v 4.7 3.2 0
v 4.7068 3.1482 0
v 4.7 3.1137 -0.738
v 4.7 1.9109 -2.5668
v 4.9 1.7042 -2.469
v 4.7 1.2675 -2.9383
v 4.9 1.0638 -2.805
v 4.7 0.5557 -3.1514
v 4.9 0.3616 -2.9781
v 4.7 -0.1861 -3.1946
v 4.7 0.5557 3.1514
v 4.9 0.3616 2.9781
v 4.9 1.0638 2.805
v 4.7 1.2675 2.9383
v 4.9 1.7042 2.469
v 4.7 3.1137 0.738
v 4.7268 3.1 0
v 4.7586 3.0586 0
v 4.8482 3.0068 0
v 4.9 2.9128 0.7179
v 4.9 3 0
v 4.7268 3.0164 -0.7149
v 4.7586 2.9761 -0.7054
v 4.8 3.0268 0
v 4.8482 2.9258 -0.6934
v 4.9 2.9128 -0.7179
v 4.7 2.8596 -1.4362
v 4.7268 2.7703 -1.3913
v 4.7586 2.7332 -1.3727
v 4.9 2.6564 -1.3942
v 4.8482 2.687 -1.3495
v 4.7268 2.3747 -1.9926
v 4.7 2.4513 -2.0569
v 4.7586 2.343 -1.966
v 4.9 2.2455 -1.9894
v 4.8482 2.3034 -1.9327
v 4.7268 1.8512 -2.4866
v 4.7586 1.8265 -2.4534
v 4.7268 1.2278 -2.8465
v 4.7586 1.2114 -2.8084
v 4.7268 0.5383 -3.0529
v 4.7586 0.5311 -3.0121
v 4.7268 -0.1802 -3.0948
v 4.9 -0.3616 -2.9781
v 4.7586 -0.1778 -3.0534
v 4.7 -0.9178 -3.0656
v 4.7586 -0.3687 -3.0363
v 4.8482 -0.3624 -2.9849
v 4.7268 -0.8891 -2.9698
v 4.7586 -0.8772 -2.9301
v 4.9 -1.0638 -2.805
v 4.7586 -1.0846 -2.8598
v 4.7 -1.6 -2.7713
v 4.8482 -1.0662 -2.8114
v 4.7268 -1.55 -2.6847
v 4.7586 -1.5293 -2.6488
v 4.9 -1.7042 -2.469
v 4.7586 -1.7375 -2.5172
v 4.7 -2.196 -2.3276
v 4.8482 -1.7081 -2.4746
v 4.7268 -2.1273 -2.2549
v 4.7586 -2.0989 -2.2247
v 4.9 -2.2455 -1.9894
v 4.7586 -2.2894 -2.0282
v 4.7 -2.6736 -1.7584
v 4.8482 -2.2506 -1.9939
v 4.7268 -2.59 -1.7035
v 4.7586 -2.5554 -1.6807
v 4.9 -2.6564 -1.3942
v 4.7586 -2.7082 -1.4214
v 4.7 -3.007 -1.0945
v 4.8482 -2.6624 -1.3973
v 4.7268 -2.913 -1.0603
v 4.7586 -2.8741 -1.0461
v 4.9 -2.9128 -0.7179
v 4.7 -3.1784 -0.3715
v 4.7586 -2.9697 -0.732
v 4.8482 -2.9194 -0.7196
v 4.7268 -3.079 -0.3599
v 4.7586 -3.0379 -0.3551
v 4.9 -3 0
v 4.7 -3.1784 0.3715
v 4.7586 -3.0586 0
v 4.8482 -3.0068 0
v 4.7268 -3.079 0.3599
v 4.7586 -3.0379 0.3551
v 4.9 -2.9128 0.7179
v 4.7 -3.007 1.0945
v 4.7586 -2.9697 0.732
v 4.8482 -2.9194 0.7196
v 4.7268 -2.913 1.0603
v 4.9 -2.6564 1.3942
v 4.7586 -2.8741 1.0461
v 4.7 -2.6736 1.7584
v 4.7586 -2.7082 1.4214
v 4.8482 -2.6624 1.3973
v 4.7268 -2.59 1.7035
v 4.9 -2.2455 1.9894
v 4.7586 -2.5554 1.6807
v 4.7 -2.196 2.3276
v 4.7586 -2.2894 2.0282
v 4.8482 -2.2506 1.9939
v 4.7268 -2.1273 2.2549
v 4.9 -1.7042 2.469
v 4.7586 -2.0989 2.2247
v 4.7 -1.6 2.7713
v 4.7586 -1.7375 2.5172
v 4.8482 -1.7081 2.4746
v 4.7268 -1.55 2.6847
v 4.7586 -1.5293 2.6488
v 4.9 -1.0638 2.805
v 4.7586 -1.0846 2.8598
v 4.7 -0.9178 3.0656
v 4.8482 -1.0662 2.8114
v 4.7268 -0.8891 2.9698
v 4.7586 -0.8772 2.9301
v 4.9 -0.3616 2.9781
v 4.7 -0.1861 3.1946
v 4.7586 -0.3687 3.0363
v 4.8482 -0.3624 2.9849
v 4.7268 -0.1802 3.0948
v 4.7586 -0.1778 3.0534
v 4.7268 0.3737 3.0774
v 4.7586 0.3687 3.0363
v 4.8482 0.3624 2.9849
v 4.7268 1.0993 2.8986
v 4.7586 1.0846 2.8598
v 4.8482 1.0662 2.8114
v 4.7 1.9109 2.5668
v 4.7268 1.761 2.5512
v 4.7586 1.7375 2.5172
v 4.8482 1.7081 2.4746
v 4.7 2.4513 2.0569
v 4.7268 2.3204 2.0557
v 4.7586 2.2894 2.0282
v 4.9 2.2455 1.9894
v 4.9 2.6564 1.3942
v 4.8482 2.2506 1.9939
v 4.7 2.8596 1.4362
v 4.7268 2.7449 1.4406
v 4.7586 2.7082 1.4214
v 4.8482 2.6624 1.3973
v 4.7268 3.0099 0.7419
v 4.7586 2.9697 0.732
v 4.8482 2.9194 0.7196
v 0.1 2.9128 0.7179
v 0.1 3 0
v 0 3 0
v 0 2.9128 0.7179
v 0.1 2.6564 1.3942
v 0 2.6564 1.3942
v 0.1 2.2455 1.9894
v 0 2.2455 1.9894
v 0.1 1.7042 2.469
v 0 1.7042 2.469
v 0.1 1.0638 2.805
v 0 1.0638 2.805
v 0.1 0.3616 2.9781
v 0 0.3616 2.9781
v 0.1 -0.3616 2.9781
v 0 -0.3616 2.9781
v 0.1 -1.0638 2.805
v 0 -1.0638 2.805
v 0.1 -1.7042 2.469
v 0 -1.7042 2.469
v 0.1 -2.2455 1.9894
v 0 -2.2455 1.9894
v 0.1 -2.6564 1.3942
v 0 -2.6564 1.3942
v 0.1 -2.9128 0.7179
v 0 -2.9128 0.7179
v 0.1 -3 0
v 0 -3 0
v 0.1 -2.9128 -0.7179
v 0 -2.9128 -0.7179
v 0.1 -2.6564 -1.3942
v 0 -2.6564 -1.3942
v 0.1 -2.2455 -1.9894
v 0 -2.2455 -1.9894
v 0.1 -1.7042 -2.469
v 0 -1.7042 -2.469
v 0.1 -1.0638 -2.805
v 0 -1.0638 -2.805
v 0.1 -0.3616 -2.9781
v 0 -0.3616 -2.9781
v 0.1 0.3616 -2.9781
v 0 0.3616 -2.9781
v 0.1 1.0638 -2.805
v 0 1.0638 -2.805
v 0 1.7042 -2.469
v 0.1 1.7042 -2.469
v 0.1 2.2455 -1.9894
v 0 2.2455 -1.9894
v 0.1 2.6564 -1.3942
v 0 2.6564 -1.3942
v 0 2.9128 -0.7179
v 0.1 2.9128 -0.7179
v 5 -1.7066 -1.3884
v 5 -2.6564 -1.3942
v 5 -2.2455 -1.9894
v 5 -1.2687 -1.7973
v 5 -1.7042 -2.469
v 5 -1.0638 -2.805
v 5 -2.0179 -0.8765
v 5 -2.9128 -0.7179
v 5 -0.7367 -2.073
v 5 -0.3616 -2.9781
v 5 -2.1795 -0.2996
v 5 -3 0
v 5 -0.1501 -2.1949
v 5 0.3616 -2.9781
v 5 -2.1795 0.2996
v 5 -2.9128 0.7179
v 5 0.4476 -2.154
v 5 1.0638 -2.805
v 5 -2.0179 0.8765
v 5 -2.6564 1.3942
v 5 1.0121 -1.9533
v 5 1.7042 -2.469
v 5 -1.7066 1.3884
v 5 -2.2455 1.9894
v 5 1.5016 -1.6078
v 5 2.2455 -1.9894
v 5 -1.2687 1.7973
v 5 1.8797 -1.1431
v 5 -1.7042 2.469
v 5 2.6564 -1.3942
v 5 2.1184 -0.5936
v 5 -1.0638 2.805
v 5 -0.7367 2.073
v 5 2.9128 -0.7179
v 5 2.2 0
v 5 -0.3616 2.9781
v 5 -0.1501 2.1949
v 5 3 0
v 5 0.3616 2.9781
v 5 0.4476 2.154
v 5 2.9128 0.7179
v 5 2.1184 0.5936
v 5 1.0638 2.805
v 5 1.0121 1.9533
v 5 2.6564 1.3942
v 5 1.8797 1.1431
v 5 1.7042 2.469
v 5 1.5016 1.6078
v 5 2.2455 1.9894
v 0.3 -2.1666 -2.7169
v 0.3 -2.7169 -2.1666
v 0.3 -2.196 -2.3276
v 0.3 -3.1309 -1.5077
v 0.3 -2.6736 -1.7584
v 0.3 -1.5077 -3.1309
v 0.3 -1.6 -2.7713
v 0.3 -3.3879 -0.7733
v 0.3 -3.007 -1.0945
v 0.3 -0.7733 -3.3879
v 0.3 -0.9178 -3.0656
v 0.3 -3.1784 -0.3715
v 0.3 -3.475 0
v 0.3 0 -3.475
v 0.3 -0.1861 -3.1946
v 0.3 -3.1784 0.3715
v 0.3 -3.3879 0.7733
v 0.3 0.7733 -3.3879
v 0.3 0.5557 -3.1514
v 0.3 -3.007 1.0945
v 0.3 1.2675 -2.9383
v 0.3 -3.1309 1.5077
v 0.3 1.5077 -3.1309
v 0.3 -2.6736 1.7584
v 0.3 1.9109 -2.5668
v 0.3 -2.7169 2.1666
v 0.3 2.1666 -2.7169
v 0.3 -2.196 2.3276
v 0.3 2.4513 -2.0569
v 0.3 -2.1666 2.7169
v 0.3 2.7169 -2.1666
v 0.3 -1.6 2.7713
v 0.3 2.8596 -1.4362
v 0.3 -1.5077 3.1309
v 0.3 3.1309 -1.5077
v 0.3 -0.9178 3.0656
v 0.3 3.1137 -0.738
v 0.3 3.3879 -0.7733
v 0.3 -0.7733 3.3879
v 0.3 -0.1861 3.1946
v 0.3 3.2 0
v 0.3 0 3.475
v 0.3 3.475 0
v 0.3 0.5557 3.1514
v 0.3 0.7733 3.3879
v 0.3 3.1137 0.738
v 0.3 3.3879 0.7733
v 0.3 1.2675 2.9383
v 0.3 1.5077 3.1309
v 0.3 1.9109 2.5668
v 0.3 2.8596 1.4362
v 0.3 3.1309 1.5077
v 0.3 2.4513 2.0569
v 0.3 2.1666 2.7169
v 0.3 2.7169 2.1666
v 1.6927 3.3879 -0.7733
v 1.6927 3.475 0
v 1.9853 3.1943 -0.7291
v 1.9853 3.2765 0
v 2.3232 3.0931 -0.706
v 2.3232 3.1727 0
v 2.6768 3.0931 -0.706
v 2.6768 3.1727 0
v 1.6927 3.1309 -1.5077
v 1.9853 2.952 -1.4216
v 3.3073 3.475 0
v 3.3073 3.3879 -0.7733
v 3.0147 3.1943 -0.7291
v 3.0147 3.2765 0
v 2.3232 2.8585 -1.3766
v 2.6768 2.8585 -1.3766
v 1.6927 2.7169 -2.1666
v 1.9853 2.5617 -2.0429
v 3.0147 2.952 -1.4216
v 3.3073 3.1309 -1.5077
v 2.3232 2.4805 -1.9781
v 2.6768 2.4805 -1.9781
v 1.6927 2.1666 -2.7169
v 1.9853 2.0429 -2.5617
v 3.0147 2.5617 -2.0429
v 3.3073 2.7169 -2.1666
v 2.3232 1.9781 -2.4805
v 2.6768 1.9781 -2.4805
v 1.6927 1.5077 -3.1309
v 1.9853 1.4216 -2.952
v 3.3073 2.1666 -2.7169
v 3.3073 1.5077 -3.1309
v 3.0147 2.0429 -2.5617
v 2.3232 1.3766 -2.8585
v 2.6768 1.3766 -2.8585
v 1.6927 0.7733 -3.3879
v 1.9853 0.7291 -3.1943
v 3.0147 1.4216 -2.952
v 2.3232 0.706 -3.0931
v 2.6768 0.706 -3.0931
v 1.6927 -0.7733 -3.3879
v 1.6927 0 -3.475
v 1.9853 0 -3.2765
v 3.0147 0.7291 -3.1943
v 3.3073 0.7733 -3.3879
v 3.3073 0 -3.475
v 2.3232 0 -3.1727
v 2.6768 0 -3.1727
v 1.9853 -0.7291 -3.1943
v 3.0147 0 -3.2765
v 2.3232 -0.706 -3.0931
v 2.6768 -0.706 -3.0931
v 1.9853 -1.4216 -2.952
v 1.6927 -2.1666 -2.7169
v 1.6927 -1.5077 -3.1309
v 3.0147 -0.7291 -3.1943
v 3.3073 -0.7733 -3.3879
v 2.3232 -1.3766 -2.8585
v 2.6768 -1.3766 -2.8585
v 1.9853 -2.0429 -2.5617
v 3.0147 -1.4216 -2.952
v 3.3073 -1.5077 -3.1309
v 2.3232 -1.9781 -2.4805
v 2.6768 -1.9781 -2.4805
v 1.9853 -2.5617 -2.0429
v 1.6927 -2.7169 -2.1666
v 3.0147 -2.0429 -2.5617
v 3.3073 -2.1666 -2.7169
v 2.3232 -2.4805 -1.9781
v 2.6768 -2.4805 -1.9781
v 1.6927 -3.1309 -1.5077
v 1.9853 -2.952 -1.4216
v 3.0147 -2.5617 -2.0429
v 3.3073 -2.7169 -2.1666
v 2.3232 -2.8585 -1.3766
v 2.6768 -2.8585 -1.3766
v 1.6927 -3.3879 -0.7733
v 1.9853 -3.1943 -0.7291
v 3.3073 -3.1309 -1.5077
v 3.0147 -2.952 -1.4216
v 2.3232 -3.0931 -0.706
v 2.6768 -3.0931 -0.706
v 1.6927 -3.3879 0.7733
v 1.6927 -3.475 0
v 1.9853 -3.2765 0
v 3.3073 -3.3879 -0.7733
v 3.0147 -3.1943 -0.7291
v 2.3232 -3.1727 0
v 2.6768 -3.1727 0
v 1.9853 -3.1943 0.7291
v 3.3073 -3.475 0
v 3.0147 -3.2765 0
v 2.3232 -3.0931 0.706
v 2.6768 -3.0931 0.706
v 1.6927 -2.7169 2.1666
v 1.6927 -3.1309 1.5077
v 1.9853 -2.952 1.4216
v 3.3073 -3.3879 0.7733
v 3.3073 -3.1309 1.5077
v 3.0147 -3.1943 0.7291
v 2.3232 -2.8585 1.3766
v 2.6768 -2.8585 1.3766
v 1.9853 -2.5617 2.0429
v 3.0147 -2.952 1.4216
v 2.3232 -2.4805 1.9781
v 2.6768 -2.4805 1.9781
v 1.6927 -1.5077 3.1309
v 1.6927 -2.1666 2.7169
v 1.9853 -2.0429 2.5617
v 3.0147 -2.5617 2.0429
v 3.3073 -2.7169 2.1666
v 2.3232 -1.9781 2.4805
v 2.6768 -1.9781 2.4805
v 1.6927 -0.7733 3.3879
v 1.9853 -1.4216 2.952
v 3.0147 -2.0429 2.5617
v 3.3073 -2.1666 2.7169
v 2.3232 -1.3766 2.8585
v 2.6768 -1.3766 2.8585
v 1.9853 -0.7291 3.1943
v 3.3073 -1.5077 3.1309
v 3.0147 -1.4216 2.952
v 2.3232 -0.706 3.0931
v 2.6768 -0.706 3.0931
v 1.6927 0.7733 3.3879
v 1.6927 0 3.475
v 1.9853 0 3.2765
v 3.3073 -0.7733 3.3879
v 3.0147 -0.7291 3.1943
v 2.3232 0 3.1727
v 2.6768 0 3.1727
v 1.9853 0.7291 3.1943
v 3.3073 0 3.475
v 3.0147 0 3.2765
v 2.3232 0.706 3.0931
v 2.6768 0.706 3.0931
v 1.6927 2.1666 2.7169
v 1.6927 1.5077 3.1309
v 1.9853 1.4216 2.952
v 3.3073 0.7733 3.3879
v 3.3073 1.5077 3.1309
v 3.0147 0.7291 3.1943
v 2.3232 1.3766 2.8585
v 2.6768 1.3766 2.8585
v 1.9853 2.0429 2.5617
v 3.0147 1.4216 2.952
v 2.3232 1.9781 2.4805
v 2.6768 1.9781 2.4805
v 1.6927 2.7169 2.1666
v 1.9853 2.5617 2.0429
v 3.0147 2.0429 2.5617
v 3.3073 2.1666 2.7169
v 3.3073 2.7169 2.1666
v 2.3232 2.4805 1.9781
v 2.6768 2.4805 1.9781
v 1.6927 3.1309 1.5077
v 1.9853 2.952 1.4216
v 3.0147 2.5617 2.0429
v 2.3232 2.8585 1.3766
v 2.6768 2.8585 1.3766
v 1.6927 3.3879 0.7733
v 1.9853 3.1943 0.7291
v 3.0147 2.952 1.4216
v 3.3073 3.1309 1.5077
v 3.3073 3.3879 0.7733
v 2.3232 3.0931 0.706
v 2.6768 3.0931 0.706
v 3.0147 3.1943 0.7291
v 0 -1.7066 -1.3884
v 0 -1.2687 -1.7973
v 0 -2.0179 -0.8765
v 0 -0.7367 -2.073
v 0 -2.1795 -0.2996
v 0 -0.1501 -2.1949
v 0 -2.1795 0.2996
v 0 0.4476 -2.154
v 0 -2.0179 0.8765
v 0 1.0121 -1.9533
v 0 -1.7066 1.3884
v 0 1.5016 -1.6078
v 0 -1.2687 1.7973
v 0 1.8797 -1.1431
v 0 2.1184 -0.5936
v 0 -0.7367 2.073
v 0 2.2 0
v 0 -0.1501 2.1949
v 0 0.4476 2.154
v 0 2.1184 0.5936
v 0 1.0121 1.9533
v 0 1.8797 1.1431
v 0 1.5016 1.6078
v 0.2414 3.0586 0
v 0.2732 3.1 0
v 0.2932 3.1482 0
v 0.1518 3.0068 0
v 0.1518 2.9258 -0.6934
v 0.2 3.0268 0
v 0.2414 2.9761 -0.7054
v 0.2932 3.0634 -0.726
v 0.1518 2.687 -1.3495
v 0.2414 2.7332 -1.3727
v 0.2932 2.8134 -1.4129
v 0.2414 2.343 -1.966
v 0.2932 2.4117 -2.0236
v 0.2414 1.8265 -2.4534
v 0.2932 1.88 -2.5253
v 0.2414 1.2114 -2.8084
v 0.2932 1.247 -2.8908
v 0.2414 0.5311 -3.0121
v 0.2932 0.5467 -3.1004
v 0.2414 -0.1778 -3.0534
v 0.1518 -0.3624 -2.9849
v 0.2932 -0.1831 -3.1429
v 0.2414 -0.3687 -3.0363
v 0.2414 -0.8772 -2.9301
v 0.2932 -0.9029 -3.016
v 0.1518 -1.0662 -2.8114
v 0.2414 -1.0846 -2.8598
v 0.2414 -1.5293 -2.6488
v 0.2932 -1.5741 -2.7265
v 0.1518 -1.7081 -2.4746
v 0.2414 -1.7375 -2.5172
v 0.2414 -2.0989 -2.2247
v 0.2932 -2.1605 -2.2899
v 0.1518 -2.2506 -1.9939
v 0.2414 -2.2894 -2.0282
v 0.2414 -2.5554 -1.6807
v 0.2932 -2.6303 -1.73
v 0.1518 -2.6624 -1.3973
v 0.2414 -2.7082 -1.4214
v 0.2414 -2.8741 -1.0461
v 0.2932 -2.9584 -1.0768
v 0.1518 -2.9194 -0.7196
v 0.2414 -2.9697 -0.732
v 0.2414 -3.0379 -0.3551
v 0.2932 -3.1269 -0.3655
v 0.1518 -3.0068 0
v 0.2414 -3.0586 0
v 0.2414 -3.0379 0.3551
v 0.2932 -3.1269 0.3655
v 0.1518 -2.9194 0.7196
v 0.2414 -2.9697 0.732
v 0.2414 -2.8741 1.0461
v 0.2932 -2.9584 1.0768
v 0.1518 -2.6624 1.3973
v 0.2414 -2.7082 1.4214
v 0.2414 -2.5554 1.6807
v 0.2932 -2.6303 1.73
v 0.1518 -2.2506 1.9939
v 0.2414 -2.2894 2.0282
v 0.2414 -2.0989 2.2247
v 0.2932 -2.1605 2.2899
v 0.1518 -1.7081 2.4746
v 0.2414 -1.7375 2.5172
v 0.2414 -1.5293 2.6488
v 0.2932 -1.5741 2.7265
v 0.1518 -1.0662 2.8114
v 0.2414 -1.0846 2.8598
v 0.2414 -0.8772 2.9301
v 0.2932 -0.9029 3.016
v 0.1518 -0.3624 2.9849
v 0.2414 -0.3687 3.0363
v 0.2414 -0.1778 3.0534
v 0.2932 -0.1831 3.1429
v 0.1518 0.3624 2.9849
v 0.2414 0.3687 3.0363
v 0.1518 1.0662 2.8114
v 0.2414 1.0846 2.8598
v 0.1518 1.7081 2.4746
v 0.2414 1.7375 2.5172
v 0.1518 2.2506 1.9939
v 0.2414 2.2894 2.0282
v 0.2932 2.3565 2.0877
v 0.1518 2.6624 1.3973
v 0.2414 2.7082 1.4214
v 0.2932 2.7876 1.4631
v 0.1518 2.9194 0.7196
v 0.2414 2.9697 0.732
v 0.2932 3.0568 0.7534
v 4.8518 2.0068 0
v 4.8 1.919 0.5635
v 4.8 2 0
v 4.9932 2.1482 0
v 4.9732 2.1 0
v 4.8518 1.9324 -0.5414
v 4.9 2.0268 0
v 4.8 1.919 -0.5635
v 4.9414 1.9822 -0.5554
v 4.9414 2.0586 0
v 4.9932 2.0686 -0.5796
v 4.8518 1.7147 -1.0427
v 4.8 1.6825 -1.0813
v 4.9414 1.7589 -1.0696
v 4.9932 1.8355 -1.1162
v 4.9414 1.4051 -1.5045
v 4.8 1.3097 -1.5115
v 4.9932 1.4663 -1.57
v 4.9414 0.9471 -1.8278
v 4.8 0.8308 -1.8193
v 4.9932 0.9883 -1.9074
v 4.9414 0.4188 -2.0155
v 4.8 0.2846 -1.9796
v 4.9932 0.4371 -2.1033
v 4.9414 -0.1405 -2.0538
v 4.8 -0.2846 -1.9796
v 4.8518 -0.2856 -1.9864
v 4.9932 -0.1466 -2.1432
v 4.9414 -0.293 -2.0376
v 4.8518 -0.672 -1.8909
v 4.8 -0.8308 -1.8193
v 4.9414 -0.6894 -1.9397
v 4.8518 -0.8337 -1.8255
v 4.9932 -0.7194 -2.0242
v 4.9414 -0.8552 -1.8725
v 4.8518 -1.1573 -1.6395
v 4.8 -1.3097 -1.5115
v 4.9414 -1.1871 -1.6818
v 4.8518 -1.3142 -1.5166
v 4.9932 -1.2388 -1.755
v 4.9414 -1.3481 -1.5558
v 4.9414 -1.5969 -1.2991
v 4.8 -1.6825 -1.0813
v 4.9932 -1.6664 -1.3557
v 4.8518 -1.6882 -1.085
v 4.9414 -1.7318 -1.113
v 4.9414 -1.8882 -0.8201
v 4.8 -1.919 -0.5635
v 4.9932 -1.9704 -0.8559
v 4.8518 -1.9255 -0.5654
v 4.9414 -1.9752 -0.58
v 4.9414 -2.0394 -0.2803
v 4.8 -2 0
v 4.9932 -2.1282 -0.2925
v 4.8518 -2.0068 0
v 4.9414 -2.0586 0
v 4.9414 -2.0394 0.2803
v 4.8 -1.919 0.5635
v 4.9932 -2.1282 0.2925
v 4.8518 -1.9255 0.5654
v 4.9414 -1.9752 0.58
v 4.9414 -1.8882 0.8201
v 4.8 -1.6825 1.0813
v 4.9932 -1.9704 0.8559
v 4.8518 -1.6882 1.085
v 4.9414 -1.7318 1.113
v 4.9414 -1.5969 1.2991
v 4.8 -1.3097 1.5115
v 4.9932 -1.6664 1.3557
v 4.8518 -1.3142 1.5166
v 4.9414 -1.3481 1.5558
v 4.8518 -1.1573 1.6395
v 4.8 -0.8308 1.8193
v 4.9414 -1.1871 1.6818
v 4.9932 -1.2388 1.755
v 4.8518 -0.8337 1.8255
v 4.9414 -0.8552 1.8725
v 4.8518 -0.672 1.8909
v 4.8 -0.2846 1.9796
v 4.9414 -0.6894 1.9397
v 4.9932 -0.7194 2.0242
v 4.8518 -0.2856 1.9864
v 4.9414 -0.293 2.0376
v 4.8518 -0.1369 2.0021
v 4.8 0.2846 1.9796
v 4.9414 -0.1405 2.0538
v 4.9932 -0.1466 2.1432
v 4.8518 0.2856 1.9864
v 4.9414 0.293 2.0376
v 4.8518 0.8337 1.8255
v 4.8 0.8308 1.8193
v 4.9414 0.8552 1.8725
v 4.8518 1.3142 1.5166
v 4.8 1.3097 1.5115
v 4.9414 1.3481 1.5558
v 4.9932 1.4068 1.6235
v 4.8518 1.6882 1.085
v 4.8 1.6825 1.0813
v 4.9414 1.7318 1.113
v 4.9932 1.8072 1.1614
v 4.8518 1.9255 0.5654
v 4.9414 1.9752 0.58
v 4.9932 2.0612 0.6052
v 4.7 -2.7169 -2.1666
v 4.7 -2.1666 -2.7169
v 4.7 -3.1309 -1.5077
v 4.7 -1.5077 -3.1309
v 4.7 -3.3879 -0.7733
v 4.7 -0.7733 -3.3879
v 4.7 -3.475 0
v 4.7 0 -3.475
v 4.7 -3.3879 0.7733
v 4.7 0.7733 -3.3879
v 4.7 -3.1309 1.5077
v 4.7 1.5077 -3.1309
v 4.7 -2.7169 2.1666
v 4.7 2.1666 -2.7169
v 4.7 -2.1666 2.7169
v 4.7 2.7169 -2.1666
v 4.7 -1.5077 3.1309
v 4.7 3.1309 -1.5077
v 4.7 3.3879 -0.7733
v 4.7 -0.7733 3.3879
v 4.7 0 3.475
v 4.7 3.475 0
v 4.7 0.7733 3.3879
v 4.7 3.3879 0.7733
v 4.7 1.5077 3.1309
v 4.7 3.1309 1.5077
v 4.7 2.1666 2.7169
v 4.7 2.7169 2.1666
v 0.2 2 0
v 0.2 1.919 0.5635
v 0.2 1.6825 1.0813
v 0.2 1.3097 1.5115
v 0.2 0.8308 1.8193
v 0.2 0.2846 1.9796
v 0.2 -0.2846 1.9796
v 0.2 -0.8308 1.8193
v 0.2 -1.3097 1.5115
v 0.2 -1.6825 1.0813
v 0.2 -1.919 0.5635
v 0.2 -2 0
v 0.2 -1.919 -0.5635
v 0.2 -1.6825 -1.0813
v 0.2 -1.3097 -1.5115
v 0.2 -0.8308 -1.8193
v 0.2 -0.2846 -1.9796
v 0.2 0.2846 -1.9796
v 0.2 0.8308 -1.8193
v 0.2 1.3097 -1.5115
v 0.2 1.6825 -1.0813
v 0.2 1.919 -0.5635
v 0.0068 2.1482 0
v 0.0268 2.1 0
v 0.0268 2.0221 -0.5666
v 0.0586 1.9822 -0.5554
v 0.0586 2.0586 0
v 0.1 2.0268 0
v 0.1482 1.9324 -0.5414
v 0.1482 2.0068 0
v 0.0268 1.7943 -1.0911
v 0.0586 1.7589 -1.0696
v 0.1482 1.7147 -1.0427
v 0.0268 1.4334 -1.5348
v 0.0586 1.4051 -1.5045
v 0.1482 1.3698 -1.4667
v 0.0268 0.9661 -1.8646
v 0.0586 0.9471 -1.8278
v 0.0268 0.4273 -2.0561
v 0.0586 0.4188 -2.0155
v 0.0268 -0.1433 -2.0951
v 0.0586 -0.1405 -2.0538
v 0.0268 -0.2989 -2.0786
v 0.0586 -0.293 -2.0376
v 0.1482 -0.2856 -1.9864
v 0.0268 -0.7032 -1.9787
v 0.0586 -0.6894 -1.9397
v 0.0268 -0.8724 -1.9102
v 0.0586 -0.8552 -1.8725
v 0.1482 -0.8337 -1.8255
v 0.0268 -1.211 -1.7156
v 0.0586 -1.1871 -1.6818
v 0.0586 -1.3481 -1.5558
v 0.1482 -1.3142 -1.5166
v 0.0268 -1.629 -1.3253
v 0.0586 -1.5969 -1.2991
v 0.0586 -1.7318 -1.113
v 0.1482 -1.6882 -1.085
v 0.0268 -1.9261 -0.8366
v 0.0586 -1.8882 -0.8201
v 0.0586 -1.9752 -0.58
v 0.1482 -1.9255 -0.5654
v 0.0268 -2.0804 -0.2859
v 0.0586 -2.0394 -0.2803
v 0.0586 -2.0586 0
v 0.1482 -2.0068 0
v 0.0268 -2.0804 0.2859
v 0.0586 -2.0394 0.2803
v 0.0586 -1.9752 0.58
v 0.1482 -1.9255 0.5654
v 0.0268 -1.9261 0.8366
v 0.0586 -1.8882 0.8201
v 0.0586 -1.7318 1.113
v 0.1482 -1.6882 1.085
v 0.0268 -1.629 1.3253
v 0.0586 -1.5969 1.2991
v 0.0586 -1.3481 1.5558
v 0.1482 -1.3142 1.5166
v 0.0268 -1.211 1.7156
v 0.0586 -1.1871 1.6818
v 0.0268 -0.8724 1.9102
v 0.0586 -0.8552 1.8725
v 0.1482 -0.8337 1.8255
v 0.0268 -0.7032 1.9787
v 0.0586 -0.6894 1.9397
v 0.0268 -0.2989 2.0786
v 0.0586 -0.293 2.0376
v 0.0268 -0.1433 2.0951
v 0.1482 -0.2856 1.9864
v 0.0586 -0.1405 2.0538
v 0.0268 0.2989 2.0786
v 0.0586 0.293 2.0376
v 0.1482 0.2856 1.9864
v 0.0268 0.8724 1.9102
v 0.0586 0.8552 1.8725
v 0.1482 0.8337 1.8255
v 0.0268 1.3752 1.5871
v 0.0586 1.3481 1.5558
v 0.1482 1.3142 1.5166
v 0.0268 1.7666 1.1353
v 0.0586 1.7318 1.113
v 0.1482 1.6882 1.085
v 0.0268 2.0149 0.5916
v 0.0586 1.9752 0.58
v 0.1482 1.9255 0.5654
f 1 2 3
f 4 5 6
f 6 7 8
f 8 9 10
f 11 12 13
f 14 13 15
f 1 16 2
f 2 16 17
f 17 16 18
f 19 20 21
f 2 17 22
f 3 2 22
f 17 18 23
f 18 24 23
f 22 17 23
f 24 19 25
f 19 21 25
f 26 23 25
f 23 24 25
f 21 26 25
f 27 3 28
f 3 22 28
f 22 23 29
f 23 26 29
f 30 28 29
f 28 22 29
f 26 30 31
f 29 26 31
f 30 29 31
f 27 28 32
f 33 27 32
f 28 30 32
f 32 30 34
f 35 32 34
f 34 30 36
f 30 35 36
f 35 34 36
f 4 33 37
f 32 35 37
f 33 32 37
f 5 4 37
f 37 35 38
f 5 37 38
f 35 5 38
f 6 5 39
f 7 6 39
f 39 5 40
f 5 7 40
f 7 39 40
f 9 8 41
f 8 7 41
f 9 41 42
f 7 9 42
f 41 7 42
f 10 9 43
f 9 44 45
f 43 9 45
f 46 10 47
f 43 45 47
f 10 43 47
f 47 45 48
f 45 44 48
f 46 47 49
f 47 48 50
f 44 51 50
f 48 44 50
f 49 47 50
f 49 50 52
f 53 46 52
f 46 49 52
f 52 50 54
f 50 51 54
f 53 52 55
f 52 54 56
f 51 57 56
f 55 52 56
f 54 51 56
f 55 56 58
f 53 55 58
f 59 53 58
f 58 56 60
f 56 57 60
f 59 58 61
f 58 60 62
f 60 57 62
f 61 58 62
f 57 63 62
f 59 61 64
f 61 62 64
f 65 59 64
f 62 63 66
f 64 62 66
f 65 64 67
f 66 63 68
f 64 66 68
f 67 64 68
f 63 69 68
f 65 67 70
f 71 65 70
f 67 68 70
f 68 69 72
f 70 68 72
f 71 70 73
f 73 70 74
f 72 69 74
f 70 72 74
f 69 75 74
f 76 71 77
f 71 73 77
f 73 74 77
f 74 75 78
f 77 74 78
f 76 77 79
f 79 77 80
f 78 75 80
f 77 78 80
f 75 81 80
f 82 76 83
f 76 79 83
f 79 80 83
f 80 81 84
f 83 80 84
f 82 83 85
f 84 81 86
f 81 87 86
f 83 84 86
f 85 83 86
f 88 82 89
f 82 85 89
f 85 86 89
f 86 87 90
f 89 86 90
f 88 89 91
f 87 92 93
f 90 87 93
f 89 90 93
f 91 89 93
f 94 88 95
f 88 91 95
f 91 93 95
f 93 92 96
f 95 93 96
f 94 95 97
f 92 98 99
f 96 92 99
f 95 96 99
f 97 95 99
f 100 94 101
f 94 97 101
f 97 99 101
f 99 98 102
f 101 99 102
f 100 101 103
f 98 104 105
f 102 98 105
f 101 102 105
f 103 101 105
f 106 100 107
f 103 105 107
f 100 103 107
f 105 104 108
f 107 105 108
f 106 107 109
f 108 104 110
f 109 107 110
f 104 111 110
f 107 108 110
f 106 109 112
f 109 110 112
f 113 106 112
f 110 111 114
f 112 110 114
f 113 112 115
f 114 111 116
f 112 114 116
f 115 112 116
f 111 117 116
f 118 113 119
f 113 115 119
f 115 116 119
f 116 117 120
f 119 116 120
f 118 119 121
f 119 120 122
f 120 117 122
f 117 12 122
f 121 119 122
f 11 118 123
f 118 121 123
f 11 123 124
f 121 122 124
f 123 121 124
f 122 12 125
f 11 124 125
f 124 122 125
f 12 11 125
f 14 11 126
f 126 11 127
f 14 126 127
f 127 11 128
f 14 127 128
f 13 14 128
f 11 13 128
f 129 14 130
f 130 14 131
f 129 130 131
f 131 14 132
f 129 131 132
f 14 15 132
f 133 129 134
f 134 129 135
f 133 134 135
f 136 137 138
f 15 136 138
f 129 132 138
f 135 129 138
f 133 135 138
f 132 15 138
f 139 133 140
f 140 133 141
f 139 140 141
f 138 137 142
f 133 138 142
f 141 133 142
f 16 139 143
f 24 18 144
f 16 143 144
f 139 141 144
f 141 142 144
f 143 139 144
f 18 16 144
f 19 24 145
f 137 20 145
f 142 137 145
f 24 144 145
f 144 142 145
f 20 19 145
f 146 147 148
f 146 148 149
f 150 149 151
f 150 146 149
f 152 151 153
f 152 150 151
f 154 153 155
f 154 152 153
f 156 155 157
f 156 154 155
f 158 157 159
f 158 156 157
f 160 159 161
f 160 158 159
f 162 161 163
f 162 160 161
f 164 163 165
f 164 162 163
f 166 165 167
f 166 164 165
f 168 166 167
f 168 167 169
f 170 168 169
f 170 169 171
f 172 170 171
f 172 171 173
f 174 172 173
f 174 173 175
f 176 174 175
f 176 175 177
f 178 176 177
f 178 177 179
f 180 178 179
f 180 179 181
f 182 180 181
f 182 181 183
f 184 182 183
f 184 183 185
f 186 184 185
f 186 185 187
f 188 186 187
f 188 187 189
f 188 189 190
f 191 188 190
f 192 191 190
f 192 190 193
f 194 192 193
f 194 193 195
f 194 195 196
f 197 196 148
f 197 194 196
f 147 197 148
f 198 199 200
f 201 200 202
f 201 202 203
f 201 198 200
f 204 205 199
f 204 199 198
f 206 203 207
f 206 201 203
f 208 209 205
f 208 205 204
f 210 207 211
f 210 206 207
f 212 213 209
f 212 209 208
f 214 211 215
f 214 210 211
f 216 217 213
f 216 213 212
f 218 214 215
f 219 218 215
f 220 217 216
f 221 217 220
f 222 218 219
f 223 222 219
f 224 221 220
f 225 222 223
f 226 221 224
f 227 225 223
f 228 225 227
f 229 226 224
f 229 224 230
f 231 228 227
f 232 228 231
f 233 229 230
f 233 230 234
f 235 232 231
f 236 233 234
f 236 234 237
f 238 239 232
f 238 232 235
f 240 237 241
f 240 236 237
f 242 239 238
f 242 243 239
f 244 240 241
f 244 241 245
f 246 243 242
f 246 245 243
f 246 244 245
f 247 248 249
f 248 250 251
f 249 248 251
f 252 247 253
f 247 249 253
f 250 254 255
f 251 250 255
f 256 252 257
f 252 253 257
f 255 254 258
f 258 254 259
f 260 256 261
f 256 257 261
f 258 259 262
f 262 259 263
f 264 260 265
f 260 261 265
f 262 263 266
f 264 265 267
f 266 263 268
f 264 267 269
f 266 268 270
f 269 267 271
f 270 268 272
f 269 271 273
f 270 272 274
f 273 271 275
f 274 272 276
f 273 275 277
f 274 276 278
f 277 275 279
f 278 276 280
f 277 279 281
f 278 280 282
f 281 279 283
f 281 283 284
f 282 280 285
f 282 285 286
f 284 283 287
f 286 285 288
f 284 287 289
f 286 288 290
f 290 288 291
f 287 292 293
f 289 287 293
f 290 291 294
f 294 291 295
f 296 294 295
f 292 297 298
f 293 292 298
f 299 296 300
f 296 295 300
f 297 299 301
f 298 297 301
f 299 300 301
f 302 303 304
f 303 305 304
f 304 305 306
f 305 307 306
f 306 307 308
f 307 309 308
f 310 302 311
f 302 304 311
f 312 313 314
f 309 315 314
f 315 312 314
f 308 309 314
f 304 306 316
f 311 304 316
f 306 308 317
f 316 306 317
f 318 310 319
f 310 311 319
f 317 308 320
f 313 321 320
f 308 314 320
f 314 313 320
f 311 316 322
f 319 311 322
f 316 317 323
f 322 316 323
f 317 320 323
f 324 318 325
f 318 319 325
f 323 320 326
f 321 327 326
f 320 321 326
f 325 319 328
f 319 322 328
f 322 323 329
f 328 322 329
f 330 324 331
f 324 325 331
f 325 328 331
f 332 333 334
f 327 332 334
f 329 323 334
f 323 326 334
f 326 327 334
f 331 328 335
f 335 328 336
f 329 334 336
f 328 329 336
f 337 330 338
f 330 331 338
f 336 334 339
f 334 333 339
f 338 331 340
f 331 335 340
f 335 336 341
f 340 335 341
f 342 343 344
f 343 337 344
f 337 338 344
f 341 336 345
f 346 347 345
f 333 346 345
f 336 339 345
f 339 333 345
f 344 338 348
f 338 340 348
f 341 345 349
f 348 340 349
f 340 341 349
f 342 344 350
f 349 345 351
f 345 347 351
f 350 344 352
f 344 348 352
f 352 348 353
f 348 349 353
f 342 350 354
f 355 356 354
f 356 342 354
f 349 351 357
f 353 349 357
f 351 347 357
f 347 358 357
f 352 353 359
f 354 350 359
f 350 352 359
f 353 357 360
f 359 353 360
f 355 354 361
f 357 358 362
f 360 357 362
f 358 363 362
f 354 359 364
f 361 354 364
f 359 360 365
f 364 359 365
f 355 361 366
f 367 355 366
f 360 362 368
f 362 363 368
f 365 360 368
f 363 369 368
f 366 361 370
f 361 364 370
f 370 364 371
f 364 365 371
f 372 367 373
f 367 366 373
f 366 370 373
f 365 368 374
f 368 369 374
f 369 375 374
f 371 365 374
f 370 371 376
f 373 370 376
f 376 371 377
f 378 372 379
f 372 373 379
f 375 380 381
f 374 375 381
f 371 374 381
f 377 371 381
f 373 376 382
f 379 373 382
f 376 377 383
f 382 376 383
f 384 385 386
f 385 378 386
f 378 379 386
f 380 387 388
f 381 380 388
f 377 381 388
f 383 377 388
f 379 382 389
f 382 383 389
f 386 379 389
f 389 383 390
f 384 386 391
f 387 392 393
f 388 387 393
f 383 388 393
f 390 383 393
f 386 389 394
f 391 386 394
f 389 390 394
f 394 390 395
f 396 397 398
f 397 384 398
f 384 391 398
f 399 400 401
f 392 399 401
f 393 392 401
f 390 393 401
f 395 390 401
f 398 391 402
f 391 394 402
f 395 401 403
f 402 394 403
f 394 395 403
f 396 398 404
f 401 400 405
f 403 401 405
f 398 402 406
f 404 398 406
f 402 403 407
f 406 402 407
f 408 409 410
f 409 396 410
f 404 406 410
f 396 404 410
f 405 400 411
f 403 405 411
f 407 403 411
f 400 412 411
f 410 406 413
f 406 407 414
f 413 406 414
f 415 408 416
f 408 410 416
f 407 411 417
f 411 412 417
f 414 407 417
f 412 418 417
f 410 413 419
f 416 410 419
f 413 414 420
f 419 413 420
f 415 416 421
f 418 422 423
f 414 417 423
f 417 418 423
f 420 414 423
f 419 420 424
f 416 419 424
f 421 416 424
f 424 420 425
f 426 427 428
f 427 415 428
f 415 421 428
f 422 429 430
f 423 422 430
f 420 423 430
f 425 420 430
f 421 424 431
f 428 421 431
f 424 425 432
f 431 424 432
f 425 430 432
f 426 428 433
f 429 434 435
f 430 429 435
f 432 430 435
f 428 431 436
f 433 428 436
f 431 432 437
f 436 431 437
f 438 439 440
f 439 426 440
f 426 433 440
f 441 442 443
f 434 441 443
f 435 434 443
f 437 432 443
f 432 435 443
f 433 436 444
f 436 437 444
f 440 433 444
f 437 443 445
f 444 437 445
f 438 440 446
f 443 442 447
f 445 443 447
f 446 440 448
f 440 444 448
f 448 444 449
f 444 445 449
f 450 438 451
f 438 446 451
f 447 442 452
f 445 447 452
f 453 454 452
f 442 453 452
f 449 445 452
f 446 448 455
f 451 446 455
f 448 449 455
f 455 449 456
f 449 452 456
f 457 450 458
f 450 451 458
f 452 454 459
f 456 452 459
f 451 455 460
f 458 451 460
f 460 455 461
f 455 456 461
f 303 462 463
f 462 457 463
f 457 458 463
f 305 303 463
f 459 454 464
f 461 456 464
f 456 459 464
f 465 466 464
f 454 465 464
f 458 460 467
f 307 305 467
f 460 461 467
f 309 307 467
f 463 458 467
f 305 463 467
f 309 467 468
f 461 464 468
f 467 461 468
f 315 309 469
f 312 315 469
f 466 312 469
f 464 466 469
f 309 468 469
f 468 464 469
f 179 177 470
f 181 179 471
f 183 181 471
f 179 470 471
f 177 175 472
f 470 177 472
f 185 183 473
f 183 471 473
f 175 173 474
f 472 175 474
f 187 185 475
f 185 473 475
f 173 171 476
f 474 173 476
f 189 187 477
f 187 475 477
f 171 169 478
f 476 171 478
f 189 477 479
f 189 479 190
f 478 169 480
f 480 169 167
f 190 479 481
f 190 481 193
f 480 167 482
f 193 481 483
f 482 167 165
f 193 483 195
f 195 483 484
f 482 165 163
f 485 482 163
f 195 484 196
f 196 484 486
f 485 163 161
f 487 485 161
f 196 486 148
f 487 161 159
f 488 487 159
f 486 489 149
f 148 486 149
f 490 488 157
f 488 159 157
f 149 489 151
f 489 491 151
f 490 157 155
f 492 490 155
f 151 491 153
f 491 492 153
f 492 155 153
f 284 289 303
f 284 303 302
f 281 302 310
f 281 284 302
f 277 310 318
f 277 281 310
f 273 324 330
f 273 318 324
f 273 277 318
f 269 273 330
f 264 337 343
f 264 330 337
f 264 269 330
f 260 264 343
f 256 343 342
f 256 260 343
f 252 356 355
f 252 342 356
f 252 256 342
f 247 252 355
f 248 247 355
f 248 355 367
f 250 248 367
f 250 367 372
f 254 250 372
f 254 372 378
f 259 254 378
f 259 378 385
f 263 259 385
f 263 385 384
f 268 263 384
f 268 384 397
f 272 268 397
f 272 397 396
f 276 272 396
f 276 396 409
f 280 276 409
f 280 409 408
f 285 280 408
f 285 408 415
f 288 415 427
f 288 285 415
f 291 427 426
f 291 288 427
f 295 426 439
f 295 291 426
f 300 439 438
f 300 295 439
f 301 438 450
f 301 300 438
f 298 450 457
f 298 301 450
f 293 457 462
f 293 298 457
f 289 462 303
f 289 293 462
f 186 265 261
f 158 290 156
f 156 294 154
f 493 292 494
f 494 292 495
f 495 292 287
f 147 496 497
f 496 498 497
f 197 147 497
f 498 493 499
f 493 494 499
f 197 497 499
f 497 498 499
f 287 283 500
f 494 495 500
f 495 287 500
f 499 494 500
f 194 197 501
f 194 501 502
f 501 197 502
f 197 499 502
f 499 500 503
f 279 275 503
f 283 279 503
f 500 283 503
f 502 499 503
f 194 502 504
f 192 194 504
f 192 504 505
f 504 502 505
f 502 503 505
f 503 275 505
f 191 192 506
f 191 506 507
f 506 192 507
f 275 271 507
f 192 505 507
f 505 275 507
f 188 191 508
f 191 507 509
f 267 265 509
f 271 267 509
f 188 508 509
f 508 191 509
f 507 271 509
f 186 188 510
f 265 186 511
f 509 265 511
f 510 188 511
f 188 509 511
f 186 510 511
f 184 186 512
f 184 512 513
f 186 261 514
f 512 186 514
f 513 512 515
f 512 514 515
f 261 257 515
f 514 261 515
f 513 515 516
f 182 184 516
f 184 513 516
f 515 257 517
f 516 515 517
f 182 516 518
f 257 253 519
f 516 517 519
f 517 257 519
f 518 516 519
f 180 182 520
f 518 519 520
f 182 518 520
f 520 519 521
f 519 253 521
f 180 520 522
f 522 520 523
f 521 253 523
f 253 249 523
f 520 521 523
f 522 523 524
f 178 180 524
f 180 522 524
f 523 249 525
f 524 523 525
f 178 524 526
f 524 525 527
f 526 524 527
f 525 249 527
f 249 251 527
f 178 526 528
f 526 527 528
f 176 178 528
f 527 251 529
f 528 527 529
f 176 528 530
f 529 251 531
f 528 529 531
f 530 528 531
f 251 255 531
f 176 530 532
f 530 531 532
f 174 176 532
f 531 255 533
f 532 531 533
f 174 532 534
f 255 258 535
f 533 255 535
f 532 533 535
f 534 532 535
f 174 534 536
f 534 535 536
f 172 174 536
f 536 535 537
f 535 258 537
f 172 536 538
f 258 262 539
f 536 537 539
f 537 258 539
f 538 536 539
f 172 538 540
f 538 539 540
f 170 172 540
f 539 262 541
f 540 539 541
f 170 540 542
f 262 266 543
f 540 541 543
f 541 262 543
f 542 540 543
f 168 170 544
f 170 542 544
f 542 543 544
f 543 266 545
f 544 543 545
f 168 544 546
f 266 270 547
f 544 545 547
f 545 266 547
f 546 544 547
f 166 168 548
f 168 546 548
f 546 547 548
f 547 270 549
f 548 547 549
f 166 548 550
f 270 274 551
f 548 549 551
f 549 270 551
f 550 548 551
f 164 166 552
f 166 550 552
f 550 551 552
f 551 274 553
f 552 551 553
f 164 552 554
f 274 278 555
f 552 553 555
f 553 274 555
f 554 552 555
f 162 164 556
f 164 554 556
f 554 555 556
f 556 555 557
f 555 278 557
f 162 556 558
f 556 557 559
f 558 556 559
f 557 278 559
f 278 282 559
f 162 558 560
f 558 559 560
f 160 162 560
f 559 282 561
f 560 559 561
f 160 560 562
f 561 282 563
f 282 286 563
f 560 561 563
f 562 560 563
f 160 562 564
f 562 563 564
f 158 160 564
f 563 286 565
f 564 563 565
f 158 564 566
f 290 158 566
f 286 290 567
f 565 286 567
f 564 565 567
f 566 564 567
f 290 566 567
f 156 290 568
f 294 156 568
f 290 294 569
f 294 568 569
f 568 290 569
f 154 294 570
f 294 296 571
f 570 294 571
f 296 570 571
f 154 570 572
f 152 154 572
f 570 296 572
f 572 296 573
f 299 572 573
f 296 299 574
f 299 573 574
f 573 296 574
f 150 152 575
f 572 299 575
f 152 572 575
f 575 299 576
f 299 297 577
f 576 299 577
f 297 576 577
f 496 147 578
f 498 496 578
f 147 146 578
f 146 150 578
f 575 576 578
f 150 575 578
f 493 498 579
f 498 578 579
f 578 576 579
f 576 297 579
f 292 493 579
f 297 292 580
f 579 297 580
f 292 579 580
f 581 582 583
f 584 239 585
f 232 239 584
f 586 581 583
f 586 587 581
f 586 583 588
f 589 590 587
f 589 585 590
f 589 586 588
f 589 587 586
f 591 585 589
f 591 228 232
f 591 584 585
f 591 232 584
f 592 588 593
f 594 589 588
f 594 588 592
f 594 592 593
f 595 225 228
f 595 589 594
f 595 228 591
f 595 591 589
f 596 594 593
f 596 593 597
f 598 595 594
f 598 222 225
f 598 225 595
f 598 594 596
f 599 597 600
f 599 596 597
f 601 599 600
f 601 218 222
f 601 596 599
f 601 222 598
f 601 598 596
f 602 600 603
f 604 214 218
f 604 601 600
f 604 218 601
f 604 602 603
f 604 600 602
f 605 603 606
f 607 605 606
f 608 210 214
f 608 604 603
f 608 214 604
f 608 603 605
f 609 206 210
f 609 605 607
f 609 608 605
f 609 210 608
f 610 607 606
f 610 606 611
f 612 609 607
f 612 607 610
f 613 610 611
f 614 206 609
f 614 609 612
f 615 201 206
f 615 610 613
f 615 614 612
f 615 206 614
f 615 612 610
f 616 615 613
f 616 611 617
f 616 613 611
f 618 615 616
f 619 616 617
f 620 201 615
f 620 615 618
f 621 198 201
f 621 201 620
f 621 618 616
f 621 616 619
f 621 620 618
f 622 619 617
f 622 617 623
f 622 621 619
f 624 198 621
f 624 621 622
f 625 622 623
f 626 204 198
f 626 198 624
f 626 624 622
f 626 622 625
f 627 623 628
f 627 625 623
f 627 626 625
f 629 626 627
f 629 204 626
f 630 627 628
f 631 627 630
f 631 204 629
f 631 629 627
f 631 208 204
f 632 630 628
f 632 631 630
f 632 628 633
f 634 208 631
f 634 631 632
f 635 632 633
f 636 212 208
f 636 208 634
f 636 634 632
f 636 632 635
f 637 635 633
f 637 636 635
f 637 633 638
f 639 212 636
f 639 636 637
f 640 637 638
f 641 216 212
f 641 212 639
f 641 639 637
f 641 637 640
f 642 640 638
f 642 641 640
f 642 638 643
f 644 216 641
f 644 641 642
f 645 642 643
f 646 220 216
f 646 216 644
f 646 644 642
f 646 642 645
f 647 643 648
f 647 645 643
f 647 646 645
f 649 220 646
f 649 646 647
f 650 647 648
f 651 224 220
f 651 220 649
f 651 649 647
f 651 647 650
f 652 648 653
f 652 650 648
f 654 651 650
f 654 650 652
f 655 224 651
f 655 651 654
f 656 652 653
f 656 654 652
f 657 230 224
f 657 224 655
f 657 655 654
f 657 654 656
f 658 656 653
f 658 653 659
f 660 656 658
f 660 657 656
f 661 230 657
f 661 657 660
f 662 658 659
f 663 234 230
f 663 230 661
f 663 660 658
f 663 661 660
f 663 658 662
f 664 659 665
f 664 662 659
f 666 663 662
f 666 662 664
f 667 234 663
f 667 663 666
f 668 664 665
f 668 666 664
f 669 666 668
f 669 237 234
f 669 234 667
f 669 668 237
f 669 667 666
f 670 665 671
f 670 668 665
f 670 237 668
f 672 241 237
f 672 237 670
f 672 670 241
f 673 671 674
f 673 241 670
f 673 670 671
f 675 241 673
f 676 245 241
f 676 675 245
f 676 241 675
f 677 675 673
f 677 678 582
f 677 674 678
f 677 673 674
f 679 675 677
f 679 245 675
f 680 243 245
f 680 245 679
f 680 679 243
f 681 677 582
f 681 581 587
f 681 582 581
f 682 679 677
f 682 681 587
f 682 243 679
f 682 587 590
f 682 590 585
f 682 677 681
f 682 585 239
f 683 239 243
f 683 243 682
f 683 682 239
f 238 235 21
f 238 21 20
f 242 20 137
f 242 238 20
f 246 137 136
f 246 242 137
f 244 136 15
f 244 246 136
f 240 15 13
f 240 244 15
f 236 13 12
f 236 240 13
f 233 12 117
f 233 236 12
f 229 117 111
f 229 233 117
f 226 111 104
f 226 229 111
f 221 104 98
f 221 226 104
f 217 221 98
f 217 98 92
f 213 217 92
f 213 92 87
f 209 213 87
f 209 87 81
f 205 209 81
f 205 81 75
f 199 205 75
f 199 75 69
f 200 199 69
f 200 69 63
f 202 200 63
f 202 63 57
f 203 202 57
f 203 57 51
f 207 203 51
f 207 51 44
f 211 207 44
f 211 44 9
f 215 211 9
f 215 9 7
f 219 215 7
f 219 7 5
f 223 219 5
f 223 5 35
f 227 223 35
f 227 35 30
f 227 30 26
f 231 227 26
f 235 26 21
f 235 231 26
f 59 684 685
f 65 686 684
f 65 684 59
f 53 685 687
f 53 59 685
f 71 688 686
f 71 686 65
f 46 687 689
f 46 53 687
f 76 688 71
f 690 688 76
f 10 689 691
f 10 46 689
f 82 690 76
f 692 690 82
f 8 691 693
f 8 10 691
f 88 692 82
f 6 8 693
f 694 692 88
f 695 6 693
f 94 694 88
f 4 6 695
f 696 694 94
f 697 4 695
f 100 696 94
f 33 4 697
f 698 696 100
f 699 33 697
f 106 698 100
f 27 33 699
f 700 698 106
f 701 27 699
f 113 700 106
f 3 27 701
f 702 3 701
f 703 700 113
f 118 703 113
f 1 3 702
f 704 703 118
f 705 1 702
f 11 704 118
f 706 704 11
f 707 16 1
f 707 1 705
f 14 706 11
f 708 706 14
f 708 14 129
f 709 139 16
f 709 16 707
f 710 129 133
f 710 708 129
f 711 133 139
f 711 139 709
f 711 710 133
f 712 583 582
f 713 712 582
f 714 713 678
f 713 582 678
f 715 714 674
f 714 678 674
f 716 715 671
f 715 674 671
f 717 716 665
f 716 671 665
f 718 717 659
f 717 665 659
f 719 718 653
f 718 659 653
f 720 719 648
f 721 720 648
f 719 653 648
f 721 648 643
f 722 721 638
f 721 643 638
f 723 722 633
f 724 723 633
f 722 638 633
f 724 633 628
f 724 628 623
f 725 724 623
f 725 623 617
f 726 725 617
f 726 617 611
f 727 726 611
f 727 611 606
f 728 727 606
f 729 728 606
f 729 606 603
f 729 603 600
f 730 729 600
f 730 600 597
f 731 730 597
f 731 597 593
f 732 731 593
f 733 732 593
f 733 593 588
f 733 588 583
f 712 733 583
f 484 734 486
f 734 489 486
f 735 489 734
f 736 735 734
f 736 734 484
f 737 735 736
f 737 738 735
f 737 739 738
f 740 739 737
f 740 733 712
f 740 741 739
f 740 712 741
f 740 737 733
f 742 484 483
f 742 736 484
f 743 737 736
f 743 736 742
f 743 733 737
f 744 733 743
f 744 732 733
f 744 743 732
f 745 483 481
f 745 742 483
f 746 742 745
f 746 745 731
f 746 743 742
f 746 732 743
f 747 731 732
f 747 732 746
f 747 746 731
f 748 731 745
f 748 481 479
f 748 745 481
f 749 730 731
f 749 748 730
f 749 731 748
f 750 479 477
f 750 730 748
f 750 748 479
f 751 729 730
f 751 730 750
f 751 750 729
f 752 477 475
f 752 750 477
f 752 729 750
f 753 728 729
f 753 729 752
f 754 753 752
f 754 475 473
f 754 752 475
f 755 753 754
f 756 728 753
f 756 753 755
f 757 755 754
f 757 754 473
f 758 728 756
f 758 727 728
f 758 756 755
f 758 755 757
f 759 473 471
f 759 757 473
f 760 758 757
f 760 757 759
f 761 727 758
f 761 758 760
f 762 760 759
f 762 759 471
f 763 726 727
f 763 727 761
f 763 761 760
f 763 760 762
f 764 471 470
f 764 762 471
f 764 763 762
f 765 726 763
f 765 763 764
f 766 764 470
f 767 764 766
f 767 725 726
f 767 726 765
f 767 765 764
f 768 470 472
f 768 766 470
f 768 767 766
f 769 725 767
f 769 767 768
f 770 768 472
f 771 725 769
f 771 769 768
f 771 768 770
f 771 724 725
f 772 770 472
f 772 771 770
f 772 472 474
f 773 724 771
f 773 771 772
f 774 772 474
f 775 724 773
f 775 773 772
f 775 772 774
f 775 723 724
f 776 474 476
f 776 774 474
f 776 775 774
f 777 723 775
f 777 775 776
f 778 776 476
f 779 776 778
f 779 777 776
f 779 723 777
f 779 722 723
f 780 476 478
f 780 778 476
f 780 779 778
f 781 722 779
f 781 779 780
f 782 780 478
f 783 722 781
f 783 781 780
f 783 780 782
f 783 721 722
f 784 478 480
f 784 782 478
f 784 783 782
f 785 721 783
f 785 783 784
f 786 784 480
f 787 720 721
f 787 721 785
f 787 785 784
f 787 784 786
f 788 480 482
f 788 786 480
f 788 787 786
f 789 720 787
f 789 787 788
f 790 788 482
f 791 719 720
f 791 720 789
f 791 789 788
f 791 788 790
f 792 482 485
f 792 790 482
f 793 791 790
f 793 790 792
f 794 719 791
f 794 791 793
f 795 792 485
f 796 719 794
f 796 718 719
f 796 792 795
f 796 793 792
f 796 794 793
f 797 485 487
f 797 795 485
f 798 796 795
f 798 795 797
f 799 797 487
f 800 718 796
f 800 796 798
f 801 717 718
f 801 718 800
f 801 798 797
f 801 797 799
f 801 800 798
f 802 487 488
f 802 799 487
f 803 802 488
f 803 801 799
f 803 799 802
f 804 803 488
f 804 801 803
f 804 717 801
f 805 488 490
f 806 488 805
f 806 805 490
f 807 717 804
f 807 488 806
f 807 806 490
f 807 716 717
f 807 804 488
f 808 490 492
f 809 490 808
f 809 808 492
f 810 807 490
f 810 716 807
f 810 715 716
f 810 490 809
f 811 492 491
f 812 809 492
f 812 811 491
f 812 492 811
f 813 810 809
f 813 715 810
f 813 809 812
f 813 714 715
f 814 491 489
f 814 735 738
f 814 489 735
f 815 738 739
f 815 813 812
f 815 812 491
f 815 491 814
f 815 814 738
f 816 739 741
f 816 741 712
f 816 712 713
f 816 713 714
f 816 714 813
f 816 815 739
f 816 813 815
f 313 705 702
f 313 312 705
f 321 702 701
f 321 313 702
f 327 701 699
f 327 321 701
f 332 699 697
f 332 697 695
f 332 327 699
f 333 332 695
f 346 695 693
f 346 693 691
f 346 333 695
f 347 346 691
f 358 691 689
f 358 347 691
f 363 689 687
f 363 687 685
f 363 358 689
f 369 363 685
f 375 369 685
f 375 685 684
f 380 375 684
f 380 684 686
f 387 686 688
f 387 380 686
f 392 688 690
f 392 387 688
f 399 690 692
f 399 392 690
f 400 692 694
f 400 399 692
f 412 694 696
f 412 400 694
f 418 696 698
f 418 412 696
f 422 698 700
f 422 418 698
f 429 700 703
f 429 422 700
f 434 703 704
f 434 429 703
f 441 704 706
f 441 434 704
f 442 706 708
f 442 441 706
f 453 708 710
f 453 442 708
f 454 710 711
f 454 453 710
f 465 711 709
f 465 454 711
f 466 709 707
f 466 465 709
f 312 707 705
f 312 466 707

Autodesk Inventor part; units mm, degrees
ref_plane "YZ Plane" through (0, 0, 0) normal (1, 0, 0) x (0, 1, 0)
ref_plane "XZ Plane" through (0, 0, 0) normal (0, 1, 0) x (-1, 0, 0)
ref_plane "XY Plane" through (0, 0, 0) normal (0, 0, 1) x (1, 0, 0)
sketch "Sketch_40" plane through (0, 0, 0) normal (0, 0, 1) x (1, 0, 0)
  line L0 (2.5, 0) -> (-2.5, 0)
  line L1 (0, 3.425) -> (0, 2.2)
  arc A0 (0, 2.2) -> (0.2, 2) centre (0.2, 2.2) ccw
  line L2 (0.2, 2) -> (4.8, 2)
  arc A1 (4.8, 2) -> (5, 2.2) centre (4.8, 2.2) ccw
  line L3 (5, 2.2) -> (5, 3.425)
  arc A2 (5, 3.425) -> (4.95, 3.475) centre (4.95, 3.425) ccw
  line L4 (4.95, 3.475) -> (3.3073, 3.475)
  arc A3 (1.6927, 3.475) -> (3.3073, 3.475) centre (2.5, 4.35) ccw
  line L5 (1.6927, 3.475) -> (0.05, 3.475)
  arc A4 (0.05, 3.475) -> (0, 3.425) centre (0.05, 3.425) ccw
revolve "Revolution1" add sketch "Sketch_40" angle 360 about axis through (2.5, 0, 0) along (1, 0, 0)
sketch "Sketch_42" plane through (0, 0, 0) normal (0, 0, 1) x (1, 0, 0)
  line L0 (2.5, 0) -> (-2.5, 0)
  line L1 (0, 7.35) -> (0, 3)
  line L2 (0, 3) -> (0.1, 3)
  arc A0 (0.1, 3) -> (0.3, 3.2) centre (0.1, 3.2) ccw
  line L3 (0.3, 3.2) -> (0.3, 7.15)
  line L4 (0.3, 7.15) -> (4.7, 7.15)
  line L5 (4.7, 7.15) -> (4.7, 3.2)
  arc A1 (4.7, 3.2) -> (4.9, 3) centre (4.9, 3.2) ccw
  line L6 (4.9, 3) -> (5, 3)
  line L7 (5, 3) -> (5, 7.35)
  line L8 (5, 7.35) -> (0, 7.35)
revolve "Revolution2" cut sketch "Sketch_42" angle 360 about axis through (2.5, 0, 0) along (1, 0, 0)
properties part number "SKF_W 624 R_PART1"
